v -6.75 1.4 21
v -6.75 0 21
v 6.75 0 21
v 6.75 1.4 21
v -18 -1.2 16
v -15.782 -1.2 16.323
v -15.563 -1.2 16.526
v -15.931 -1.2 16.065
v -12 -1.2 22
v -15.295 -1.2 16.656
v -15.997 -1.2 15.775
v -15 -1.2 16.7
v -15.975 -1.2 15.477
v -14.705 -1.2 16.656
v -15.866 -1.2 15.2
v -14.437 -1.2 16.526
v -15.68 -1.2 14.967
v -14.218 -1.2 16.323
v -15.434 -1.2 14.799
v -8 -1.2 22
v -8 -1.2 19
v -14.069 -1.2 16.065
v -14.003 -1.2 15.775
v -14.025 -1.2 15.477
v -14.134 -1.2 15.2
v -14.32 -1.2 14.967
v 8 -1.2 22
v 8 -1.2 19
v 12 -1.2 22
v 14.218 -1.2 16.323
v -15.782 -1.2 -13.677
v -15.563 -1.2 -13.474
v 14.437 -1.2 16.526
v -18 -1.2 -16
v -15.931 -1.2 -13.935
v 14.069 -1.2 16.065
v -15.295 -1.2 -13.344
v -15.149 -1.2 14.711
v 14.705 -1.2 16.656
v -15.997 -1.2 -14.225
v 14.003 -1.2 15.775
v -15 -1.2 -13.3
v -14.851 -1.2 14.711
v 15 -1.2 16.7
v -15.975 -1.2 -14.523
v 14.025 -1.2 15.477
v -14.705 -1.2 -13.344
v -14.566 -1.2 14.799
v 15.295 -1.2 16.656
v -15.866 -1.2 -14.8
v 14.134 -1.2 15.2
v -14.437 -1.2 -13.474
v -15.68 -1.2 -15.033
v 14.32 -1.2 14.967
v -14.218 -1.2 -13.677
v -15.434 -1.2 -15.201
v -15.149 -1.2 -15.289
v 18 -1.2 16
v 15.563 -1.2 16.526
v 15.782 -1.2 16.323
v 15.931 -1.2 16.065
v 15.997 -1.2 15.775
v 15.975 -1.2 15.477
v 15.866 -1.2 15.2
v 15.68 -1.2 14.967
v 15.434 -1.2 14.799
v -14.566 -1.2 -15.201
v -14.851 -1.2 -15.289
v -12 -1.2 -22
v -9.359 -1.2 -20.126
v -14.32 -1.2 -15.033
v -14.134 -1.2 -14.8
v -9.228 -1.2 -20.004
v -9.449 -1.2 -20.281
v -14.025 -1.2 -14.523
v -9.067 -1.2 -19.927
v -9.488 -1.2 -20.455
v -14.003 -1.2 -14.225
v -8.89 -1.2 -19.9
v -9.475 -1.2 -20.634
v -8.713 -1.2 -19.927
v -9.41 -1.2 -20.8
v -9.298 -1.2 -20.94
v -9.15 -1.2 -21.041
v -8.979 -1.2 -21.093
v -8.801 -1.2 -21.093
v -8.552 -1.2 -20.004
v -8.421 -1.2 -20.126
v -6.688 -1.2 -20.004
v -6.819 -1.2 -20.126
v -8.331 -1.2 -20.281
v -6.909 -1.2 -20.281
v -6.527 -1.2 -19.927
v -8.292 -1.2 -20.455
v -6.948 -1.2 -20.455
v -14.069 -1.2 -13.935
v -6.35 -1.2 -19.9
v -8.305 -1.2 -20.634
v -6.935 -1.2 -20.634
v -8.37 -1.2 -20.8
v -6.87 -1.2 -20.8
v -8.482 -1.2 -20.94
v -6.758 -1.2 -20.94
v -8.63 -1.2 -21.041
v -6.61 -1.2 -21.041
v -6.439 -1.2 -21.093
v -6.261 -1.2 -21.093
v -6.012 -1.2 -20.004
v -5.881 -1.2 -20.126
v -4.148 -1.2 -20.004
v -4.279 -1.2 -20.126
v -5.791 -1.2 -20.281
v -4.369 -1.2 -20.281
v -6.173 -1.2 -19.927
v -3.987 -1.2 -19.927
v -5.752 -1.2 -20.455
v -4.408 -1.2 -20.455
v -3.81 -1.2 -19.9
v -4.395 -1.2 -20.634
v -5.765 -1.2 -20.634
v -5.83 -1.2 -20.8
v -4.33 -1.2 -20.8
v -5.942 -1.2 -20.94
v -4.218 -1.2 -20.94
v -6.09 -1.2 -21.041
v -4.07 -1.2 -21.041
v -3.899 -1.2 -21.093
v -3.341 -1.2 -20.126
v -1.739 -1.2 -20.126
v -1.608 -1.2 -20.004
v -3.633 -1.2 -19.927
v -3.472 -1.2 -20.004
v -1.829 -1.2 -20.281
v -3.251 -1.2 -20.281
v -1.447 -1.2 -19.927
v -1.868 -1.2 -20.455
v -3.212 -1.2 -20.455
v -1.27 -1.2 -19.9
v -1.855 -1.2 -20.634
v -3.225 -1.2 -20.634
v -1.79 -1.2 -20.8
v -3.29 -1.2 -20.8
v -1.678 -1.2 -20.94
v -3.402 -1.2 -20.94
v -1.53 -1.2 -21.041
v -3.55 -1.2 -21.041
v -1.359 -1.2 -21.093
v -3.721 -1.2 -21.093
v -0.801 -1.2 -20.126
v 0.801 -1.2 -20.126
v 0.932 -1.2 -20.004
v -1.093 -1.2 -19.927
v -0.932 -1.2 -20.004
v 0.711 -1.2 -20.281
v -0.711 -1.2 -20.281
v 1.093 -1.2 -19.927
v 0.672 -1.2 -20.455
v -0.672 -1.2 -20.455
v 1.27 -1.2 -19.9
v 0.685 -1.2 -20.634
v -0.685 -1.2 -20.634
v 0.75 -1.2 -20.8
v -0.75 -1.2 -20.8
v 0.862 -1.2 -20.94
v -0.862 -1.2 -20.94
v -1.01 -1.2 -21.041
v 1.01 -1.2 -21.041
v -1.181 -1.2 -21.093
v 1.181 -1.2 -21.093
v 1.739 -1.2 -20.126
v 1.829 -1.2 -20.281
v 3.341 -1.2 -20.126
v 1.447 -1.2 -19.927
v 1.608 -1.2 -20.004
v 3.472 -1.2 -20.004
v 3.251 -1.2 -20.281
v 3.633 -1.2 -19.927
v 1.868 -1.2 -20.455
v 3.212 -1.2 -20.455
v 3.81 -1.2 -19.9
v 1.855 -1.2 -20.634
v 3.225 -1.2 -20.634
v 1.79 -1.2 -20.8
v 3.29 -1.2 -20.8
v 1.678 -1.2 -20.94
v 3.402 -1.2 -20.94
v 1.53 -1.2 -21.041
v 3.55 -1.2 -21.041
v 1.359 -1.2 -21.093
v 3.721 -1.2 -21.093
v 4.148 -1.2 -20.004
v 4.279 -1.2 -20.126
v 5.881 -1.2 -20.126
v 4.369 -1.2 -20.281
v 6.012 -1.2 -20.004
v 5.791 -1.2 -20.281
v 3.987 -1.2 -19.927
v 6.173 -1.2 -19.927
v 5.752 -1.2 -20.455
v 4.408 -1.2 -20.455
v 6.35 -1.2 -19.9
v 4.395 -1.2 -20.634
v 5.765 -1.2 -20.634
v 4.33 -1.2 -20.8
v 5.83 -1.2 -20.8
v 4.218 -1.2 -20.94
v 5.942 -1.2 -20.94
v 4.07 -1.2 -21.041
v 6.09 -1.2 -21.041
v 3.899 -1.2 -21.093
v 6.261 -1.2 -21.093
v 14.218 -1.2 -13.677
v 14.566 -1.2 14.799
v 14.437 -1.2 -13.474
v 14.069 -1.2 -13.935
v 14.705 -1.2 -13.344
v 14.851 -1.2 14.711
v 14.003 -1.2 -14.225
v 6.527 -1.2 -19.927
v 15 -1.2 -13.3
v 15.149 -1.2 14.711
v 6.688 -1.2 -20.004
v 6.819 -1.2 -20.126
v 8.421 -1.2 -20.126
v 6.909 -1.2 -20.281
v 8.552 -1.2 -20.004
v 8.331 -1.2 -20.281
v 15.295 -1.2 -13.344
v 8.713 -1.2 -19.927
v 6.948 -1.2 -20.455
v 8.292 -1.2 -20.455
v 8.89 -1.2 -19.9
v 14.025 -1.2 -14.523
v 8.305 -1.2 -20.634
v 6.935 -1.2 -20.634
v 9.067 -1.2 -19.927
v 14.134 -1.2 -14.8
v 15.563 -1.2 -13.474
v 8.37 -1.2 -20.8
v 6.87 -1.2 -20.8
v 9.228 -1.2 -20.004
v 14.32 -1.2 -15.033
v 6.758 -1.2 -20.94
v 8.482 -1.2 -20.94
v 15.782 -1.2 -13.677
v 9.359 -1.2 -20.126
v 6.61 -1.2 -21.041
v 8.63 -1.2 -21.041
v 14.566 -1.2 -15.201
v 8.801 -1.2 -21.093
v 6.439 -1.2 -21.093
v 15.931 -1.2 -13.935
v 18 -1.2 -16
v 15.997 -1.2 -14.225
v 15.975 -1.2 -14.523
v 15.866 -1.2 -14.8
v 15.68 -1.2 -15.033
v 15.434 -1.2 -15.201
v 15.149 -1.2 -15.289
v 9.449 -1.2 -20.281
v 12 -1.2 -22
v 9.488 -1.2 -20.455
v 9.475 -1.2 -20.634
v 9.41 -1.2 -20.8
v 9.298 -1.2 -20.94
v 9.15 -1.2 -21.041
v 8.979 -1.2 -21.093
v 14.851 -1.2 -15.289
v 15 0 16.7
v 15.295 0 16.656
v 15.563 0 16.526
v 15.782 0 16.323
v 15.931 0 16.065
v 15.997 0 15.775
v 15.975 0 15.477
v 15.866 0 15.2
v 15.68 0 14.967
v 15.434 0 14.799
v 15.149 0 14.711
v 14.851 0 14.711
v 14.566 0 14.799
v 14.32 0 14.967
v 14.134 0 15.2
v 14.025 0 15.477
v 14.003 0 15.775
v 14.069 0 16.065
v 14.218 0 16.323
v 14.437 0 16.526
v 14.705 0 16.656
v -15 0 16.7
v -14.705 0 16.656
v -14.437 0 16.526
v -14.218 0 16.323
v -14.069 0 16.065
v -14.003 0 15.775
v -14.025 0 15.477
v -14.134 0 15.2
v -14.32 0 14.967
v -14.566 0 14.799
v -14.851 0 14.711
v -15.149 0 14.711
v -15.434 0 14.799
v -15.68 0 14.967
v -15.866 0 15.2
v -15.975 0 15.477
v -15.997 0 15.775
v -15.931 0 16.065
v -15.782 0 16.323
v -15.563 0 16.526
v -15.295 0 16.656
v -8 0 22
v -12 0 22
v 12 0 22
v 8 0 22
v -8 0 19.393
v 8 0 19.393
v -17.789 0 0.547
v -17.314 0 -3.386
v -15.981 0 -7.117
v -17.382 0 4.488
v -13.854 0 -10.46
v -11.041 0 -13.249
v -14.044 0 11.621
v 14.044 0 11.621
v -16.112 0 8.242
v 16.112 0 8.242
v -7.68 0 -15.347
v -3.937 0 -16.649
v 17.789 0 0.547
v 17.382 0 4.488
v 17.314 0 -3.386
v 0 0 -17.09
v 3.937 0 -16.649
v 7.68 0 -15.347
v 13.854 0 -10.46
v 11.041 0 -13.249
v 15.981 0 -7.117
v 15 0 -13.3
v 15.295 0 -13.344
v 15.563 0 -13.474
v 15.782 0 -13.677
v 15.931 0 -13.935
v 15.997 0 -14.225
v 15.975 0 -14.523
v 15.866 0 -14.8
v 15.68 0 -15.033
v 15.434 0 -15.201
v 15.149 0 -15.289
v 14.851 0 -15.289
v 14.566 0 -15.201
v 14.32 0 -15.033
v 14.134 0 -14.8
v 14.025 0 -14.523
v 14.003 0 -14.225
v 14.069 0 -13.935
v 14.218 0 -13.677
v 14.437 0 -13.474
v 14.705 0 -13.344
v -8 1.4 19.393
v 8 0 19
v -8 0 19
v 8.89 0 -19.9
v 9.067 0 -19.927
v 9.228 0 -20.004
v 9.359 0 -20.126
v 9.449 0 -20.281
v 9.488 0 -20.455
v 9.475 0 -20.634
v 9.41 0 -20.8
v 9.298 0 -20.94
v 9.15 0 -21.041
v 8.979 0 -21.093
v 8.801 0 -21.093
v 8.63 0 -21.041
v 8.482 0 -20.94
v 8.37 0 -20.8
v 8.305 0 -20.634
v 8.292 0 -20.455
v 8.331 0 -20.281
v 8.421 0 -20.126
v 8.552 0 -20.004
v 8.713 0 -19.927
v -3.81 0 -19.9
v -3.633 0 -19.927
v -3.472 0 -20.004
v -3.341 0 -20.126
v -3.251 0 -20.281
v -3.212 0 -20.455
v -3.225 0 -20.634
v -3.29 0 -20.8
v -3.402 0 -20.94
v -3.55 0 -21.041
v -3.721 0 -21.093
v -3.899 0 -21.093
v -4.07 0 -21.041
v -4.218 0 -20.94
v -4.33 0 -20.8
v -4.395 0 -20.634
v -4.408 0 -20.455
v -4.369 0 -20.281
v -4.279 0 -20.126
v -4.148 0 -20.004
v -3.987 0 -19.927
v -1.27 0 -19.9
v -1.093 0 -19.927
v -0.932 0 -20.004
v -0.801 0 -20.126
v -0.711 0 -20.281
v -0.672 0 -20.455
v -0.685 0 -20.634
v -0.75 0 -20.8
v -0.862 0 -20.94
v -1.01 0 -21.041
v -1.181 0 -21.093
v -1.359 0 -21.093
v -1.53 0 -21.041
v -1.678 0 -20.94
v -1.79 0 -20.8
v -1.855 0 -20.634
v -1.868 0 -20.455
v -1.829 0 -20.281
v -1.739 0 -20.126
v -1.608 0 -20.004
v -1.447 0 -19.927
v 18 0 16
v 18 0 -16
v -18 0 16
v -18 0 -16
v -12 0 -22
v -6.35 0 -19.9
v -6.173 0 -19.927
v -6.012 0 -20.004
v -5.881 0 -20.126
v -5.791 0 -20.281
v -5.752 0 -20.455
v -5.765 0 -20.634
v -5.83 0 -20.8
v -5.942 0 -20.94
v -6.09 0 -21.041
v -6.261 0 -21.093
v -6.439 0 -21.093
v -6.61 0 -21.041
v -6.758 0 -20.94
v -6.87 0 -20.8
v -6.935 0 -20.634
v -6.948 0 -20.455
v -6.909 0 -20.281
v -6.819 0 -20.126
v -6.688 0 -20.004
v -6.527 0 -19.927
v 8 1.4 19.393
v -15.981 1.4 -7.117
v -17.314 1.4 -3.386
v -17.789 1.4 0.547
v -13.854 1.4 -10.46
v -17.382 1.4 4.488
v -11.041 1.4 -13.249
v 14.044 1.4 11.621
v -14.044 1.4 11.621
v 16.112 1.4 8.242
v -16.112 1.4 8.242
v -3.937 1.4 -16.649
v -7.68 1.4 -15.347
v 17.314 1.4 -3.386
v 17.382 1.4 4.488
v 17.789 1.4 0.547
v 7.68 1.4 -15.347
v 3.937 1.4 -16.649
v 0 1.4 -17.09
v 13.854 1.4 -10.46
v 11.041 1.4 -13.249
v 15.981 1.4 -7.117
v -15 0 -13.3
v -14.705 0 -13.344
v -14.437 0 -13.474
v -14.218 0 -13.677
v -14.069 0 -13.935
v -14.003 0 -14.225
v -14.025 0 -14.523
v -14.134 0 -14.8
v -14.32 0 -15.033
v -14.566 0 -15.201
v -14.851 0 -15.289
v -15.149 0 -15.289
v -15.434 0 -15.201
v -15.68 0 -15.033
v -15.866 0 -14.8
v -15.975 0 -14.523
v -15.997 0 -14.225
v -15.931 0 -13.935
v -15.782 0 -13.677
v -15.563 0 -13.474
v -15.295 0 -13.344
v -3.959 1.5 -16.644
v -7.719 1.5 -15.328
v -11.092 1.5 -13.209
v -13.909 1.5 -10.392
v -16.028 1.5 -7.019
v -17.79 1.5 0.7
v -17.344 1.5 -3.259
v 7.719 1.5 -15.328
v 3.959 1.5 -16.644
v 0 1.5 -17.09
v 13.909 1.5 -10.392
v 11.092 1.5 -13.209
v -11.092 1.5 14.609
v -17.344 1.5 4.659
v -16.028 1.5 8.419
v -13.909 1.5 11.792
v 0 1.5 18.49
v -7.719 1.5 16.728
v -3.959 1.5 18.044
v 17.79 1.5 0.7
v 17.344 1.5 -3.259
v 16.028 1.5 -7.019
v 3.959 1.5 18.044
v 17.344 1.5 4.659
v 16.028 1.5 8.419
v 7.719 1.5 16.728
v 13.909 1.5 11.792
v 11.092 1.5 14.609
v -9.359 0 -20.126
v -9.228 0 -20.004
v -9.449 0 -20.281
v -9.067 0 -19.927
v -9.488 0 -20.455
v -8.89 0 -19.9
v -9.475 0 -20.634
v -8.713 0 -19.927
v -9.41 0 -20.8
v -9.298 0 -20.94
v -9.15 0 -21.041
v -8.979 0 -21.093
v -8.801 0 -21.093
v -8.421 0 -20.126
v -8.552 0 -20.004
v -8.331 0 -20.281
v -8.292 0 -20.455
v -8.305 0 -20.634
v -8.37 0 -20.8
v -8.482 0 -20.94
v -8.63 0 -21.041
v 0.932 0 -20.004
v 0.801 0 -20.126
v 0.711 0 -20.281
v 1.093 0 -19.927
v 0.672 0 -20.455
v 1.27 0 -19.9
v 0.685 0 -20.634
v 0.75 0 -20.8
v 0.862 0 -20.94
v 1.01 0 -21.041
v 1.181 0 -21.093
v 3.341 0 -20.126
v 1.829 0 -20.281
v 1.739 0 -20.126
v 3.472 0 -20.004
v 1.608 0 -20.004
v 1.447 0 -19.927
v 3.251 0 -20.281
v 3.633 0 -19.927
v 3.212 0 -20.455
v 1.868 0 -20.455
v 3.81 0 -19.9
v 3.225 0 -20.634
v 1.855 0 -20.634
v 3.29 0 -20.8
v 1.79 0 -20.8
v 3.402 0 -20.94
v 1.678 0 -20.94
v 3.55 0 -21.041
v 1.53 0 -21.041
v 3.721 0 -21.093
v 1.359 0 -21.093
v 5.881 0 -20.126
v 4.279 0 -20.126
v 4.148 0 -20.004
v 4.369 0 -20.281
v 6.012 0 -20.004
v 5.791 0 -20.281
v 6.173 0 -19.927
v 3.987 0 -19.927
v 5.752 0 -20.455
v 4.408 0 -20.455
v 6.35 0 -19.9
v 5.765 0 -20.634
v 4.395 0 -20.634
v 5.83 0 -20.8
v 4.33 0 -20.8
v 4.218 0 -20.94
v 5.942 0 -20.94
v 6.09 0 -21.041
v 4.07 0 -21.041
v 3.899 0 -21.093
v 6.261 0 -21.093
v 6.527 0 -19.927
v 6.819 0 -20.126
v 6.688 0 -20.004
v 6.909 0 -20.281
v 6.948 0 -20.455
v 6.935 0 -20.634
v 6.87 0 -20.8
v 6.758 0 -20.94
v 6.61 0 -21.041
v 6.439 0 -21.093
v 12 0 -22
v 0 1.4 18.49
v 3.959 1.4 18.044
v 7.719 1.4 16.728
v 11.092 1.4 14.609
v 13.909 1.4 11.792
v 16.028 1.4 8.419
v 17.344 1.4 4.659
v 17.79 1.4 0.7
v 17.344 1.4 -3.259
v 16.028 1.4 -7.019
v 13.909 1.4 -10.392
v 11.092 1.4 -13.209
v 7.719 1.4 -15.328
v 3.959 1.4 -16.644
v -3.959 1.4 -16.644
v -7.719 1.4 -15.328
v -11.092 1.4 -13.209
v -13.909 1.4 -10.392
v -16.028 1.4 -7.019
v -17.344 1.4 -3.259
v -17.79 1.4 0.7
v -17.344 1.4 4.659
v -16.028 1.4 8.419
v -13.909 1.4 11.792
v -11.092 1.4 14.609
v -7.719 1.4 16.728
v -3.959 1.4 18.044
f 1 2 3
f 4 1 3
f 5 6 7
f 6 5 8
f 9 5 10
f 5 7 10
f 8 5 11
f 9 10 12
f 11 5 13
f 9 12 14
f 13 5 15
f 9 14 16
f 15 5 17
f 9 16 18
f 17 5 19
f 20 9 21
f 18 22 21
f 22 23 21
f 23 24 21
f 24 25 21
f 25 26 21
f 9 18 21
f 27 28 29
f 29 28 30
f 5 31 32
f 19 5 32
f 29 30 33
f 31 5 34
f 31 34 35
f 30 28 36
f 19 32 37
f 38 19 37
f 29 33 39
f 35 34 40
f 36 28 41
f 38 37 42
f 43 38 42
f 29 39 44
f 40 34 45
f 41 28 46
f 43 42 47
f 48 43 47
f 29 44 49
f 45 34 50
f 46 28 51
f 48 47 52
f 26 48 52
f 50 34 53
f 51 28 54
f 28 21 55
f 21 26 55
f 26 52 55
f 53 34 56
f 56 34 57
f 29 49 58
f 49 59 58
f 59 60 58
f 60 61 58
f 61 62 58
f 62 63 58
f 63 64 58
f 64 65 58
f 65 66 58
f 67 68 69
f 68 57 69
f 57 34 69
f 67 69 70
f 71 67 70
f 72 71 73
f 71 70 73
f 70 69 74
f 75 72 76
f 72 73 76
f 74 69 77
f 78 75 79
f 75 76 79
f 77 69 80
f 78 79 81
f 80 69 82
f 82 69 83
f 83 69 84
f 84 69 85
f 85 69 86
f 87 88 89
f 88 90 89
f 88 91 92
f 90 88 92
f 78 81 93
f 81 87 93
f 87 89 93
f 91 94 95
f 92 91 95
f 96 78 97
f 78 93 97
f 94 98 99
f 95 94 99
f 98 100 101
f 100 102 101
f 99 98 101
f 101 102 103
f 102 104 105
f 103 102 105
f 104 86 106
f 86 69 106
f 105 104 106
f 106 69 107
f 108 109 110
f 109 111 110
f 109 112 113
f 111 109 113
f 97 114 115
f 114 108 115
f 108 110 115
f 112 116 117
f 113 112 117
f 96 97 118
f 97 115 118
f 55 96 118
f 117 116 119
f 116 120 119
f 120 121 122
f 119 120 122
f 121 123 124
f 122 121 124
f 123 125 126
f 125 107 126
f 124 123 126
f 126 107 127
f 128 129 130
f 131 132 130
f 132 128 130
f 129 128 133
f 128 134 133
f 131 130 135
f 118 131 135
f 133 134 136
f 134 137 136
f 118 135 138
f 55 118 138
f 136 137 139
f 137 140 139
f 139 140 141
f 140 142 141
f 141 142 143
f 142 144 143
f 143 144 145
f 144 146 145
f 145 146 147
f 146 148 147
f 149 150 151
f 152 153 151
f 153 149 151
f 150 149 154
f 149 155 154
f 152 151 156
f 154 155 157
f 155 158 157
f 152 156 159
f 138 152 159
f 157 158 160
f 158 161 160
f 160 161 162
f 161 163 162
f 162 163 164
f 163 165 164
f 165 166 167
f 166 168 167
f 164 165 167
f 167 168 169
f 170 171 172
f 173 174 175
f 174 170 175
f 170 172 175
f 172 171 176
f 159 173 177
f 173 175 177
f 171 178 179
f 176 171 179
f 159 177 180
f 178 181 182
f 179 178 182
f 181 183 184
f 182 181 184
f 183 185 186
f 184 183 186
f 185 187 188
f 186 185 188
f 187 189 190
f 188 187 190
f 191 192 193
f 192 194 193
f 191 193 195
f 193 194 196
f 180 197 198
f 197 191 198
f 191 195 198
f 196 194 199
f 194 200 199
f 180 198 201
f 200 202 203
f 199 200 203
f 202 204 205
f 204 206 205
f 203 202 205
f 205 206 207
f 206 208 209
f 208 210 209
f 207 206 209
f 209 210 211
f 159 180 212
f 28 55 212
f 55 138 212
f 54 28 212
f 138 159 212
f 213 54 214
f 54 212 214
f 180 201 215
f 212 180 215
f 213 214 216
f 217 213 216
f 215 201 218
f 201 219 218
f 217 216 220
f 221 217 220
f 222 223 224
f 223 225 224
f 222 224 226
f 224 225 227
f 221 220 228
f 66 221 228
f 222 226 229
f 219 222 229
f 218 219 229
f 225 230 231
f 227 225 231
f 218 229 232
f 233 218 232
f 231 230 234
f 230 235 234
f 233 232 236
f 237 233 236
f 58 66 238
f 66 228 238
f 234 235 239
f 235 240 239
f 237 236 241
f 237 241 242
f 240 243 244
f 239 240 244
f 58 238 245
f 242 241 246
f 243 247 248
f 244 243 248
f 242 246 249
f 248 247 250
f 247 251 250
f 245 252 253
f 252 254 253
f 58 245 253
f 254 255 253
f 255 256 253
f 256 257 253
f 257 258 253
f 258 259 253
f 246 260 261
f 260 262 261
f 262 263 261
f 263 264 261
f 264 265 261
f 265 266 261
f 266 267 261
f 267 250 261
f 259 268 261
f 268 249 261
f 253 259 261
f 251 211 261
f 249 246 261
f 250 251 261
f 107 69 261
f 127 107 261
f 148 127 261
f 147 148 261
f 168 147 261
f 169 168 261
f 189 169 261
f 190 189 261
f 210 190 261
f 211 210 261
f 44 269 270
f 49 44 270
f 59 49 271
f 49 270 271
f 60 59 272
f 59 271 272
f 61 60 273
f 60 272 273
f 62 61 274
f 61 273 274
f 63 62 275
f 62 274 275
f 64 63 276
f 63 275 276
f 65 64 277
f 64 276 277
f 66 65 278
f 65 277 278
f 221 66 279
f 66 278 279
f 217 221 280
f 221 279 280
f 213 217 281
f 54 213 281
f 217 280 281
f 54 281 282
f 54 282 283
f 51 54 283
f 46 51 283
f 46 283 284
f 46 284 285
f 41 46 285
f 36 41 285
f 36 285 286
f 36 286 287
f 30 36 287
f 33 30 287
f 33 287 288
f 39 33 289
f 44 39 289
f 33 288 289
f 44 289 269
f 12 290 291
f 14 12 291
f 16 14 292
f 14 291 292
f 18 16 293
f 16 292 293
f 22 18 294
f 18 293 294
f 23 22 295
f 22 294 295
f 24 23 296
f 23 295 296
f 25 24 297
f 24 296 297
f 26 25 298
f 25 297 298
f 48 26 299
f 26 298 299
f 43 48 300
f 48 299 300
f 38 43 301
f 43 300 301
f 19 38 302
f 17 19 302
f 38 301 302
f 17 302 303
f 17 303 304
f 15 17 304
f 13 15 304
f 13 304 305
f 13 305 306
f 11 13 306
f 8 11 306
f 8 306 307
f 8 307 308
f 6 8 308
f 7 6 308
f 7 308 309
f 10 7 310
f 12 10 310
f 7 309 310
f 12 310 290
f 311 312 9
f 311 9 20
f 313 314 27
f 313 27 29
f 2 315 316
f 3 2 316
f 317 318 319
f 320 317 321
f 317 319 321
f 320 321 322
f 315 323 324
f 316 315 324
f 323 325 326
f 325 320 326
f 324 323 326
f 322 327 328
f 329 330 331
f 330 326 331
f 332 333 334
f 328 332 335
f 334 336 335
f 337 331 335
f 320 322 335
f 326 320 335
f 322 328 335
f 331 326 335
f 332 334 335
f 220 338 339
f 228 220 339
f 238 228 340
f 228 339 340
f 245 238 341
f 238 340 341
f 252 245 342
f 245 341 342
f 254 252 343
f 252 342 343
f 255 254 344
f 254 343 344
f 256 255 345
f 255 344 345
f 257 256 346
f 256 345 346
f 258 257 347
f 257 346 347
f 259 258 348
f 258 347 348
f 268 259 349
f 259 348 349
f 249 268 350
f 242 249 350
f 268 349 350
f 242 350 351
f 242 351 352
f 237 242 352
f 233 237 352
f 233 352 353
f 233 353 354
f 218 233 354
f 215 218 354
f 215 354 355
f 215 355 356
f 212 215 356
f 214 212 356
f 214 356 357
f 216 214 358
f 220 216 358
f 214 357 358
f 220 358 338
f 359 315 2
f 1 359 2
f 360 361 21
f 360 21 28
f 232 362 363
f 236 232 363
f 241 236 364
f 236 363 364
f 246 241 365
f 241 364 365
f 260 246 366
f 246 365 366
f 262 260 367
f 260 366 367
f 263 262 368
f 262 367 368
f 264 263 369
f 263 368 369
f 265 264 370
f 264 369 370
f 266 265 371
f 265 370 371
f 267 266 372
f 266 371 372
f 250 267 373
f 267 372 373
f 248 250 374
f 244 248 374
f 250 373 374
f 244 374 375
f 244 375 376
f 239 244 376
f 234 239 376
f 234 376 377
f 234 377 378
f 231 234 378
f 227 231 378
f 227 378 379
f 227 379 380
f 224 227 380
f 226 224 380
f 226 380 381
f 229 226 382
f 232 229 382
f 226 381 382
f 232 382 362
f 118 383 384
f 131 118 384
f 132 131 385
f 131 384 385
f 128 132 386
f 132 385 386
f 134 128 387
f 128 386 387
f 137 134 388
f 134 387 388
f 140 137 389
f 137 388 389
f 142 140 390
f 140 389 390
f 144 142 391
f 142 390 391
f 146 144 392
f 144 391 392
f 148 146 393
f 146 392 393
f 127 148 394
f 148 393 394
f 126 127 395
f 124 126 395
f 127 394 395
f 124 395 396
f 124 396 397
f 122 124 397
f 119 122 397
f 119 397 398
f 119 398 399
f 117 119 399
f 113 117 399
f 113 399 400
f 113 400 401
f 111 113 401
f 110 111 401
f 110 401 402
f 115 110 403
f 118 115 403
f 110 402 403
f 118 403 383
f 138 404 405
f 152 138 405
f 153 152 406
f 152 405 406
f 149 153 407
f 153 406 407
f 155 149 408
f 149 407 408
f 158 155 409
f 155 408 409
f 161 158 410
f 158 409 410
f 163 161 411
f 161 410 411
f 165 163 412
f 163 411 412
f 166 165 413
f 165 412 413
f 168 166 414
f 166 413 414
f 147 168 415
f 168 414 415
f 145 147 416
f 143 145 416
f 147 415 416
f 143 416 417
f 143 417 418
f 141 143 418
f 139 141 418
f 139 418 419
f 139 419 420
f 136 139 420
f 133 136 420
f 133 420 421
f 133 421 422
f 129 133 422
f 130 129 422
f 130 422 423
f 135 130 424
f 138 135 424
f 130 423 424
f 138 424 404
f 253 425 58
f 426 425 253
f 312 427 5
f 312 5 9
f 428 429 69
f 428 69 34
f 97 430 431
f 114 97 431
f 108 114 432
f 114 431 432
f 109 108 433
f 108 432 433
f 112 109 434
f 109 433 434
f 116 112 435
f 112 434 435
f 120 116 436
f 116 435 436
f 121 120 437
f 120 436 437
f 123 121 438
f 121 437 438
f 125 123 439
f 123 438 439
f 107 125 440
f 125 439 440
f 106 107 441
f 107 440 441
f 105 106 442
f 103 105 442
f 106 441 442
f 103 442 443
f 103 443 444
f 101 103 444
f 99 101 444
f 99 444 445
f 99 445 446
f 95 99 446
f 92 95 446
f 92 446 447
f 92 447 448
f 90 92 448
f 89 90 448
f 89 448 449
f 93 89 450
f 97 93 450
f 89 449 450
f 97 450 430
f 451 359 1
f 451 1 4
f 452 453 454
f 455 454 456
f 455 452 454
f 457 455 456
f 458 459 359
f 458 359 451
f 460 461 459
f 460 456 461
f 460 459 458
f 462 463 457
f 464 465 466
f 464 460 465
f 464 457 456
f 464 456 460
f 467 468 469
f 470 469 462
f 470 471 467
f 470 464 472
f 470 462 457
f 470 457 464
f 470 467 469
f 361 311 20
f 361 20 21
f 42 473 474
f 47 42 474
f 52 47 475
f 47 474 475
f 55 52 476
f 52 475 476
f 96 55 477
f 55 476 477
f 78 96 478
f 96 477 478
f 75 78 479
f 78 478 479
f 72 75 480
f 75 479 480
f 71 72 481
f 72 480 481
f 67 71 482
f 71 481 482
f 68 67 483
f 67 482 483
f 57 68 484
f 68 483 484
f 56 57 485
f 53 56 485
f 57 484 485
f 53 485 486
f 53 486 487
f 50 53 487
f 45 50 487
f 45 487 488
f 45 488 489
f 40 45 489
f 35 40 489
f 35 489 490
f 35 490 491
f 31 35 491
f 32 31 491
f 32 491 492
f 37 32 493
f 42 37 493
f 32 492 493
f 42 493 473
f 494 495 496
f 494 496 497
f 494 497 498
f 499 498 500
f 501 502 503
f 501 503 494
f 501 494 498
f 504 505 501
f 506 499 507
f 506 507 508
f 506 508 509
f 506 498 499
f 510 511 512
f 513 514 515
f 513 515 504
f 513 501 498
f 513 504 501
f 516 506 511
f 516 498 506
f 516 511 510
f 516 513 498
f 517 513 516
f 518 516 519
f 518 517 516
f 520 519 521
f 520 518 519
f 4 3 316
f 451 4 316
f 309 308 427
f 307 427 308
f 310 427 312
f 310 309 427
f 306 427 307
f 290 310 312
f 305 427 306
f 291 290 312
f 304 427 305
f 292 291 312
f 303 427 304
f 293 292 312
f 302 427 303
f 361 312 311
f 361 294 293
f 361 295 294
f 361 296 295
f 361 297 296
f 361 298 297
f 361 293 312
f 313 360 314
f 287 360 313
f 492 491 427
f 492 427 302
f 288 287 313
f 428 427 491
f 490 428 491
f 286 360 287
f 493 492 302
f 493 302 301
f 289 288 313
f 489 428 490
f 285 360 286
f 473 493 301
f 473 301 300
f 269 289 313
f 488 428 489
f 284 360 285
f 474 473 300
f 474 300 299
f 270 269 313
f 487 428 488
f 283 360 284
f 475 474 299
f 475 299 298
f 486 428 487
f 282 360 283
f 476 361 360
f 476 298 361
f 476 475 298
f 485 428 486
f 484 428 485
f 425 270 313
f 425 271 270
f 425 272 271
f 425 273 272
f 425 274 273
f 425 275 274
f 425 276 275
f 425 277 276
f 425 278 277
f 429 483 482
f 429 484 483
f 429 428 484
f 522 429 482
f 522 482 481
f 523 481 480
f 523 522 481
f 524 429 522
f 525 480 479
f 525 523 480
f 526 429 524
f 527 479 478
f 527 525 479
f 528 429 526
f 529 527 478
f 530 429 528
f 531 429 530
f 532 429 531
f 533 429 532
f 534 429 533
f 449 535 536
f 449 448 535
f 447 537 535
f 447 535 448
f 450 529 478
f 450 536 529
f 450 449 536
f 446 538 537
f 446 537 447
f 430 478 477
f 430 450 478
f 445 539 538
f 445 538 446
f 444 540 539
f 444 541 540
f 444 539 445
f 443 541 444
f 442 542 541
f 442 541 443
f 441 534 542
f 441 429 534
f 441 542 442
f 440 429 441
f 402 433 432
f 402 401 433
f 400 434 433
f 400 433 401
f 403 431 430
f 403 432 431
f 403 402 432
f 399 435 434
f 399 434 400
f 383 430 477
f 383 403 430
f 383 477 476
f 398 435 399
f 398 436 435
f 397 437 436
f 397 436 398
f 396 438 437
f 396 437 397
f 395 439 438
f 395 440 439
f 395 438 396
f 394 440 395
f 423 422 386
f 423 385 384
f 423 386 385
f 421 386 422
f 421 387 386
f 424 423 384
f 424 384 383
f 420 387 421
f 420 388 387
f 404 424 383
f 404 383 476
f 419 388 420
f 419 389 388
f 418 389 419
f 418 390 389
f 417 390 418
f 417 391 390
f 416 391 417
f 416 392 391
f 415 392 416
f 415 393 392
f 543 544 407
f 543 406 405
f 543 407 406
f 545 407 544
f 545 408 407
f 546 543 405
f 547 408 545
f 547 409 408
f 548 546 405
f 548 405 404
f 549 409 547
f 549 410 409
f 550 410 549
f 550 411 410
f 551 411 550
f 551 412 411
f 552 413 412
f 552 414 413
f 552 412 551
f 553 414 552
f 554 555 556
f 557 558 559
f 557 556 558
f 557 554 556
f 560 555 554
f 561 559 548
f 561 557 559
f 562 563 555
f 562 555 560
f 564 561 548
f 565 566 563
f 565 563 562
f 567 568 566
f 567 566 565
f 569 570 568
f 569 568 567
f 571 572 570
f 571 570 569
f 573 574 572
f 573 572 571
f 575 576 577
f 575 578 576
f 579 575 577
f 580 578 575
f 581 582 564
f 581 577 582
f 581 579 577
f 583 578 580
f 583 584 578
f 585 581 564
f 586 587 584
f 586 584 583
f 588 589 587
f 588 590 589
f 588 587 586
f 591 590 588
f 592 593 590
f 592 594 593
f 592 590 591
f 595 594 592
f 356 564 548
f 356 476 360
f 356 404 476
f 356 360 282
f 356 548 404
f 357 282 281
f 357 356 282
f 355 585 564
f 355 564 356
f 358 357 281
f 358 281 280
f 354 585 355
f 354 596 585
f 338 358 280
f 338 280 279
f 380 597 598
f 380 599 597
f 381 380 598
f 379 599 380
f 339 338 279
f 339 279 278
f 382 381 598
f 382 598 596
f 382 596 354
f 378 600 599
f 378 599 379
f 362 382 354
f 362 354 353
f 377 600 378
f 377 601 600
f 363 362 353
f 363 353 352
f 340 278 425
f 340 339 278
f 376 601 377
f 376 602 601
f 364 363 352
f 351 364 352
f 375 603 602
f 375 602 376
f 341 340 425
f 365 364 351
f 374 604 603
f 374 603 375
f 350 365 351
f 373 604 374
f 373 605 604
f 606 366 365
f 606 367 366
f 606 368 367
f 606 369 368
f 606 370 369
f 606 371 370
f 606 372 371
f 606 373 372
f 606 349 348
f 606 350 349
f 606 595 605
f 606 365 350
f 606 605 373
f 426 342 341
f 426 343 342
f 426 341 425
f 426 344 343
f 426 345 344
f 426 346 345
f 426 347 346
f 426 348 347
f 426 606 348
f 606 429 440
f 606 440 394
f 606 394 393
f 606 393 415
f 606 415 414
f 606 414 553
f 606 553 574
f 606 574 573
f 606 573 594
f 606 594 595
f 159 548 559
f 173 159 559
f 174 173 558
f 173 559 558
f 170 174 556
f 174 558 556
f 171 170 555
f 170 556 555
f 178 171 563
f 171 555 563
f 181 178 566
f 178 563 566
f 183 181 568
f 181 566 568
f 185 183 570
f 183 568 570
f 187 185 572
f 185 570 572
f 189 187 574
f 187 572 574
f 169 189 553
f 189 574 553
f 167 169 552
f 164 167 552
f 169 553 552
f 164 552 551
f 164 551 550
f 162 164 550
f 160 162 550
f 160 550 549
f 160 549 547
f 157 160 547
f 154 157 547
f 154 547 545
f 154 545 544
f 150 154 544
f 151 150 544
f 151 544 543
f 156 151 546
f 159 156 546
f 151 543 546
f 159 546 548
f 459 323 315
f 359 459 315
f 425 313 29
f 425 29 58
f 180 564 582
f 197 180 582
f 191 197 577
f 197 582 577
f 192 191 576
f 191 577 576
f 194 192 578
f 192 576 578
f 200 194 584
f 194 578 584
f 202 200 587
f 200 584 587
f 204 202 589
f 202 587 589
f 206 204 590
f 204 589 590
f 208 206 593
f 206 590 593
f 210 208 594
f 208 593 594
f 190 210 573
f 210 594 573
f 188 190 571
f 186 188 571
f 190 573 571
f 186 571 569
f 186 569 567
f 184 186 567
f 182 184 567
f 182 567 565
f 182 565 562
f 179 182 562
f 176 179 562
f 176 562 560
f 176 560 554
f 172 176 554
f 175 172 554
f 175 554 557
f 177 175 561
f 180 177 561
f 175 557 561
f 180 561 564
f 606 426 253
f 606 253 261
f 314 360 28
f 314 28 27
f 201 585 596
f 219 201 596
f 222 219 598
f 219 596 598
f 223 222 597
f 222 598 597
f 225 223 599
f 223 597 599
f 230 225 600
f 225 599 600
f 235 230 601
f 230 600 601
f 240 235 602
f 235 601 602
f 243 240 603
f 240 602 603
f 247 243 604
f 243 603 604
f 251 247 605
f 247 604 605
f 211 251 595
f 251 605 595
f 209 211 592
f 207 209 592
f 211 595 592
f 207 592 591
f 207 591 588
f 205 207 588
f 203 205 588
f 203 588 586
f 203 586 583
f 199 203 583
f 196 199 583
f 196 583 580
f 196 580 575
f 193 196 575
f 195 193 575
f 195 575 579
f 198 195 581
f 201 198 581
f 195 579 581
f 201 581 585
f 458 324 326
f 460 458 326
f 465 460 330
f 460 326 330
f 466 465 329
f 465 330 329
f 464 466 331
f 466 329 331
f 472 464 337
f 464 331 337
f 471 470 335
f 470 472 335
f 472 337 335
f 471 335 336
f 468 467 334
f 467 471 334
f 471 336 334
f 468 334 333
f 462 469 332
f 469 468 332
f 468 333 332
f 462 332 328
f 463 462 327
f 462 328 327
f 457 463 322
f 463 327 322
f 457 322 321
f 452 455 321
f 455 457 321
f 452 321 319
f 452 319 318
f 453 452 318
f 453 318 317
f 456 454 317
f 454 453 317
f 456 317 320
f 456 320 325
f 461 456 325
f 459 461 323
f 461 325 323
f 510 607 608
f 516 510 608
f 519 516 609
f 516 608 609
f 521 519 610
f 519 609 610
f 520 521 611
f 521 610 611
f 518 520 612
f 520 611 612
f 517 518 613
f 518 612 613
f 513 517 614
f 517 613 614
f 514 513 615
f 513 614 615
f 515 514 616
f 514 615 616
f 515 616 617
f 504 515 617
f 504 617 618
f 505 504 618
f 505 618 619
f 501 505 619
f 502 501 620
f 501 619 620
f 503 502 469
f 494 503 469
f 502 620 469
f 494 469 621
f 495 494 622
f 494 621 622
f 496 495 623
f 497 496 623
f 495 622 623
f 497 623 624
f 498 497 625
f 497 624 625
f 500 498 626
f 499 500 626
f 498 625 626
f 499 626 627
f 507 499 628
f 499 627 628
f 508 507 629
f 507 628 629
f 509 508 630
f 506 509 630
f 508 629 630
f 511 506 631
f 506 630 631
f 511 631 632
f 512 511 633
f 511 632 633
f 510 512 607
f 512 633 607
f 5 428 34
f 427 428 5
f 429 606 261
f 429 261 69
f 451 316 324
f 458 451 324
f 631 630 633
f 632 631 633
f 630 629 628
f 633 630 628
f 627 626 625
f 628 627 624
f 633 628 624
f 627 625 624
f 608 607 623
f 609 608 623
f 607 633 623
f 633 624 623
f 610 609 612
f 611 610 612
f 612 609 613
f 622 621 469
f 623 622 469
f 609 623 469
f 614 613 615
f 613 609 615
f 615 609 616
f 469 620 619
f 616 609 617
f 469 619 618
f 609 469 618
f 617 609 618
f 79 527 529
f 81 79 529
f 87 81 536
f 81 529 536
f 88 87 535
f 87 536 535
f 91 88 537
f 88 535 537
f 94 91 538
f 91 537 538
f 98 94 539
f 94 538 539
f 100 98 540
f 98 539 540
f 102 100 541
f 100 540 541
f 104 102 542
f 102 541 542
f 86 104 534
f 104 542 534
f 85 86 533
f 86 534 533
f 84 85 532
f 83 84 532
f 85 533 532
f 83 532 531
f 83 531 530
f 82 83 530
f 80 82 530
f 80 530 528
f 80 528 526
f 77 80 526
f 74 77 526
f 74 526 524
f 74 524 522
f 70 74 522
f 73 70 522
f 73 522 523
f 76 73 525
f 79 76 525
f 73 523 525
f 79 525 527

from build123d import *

# Parameters (mm, degrees)
SKETCH2_R           = 1
SKETCH2_R_2         = 0.6
SKETCH2_R_3         = 17.79
SKETCH2_R_4         = 16.2
BOSS_EXTRUDE1_DEPTH = 1.2
SKETCH2_3_R         = 17.79
SKETCH2_3_R_2       = 16.2
BOSS_EXTRUDE2_DEPTH = 1.4
BOSS_EXTRUDE3_START = 1.4
SKETCH2_4_R         = 17.79
SKETCH2_4_R_2       = 16.2
BOSS_EXTRUDE3_DEPTH = 0.1


with BuildPart() as part:
    # Sketch2 → Boss-Extrude1 (new body)
    # profile 1 of 4: a face of its own
    with BuildSketch(Plane(origin=(0, 0, 0), x_dir=(1, 0, 0), z_dir=(0, 1, 0))):
        with BuildLine():
            Line((-18, 16), (-18, -16))
            Line((-18, -16), (-12, -22))
            Line((-12, -22), (-8, -22))
            Line((-8, -22), (-8, -19.392543934))
            Line((-8, -19.392543934), (-14.043607284, -11.620677381))
            ThreePointArc((-14.043607284, -11.620677381), (-5.772708481, 16.127356797), (17.79, -0.7))
            ThreePointArc((17.79, -0.7), (16.827356797, -6.472708481), (14.043607284, -11.620677381))
            Line((14.043607284, -11.620677381), (8, -19.392543934))
            Line((8, -19.392543934), (8, -22))
            Line((8, -22), (12, -22))
            Line((12, -22), (18, -16))
            Line((18, -16), (18, 16))
            Line((18, 16), (12, 22))
            Line((12, 22), (-12, 22))
            Line((-12, 22), (-18, 16))
        make_face()
        with Locations(Location((-15, -15.7, 0), (0, 0, 270))):
            Circle(SKETCH2_R, mode=Mode.SUBTRACT)
        with Locations(Location((15, -15.7, 0), (0, 0, 270))):
            Circle(SKETCH2_R, mode=Mode.SUBTRACT)
        with Locations(Location((-15, 14.3, 0), (0, 0, 270))):
            Circle(SKETCH2_R, mode=Mode.SUBTRACT)
        with Locations(Location((-8.89, 20.5, 0), (0, 0, 270))):
            Circle(SKETCH2_R_2, mode=Mode.SUBTRACT)
        with Locations(Location((-6.35, 20.5, 0), (0, 0, 270))):
            Circle(SKETCH2_R_2, mode=Mode.SUBTRACT)
        with Locations(Location((-3.81, 20.5, 0), (0, 0, 270))):
            Circle(SKETCH2_R_2, mode=Mode.SUBTRACT)
        with Locations(Location((-1.27, 20.5, 0), (0, 0, 270))):
            Circle(SKETCH2_R_2, mode=Mode.SUBTRACT)
        with Locations(Location((1.27, 20.5, 0), (0, 0, 270))):
            Circle(SKETCH2_R_2, mode=Mode.SUBTRACT)
        with Locations(Location((3.81, 20.5, 0), (0, 0, 270))):
            Circle(SKETCH2_R_2, mode=Mode.SUBTRACT)
        with Locations(Location((6.35, 20.5, 0), (0, 0, 270))):
            Circle(SKETCH2_R_2, mode=Mode.SUBTRACT)
        with Locations(Location((8.89, 20.5, 0), (0, 0, 270))):
            Circle(SKETCH2_R_2, mode=Mode.SUBTRACT)
        with Locations(Location((15, 14.3, 0), (0, 0, 270))):
            Circle(SKETCH2_R, mode=Mode.SUBTRACT)
    # profile 2 of 4: a face of its own
    with BuildSketch(Plane(origin=(0, 0, 0), x_dir=(1, 0, 0), z_dir=(0, 1, 0))):
        with Locations((0, -0.7)):
            Circle(SKETCH2_R_3)
        with Locations((0, -0.7)):
            Circle(SKETCH2_R_4, mode=Mode.SUBTRACT)
    # profile 3 of 4: a face of its own
    with BuildSketch(Plane(origin=(0, 0, 0), x_dir=(1, 0, 0), z_dir=(0, 1, 0))):
        with Locations((0, -0.7)):
            Circle(SKETCH2_R_4)
    # profile 4 of 4: a face of its own
    with BuildSketch(Plane(origin=(0, 0, 0), x_dir=(1, 0, 0), z_dir=(0, 1, 0))):
        with BuildLine():
            Line((-14.043607284, -11.620677381), (-8, -19.392543934))
            Line((-8, -19.392543934), (-8, -19))
            Line((-8, -19), (8, -19))
            Line((8, -19), (8, -19.392543934))
            Line((8, -19.392543934), (14.043607284, -11.620677381))
            ThreePointArc((14.043607284, -11.620677381), (0, -18.49), (-14.043607284, -11.620677381))
        make_face()
    extrude(amount=-BOSS_EXTRUDE1_DEPTH)


with BuildPart() as body_2:
    # Sketch2<3> → Boss-Extrude2 (new body)
    # profile 1 of 4: a face of its own
    with BuildSketch(Plane(origin=(0, 0, 0), x_dir=(1, 0, 0), z_dir=(0, 1, 0))):
        with BuildLine():
            Line((-14.043607284, -11.620677381), (-8, -19.392543934))
            Line((-8, -19.392543934), (-8, -19))
            Line((-8, -19), (8, -19))
            Line((8, -19), (8, -19.392543934))
            Line((8, -19.392543934), (14.043607284, -11.620677381))
            ThreePointArc((14.043607284, -11.620677381), (0, -18.49), (-14.043607284, -11.620677381))
        make_face()
    # profile 2 of 4: a face of its own
    with BuildSketch(Plane(origin=(0, 0, 0), x_dir=(1, 0, 0), z_dir=(0, 1, 0))):
        with Locations((0, -0.7)):
            Circle(SKETCH2_3_R)
        with Locations((0, -0.7)):
            Circle(SKETCH2_3_R_2, mode=Mode.SUBTRACT)
    # profile 3 of 4: a face of its own
    with BuildSketch(Plane(origin=(0, 0, 0), x_dir=(1, 0, 0), z_dir=(0, 1, 0))):
        Polygon((-8, -19), (-8, -19.392543934), (-6.75, -21), (6.75, -21), (8, -19.392543934), (8, -19), align=None)
    # profile 4 of 4: a face of its own
    with BuildSketch(Plane(origin=(0, 0, 0), x_dir=(1, 0, 0), z_dir=(0, 1, 0))):
        with Locations((0, -0.7)):
            Circle(SKETCH2_3_R_2)
    extrude(amount=BOSS_EXTRUDE2_DEPTH)


with BuildPart() as body_3:
    # Sketch2<4> → Boss-Extrude3 (new body)
    # profile 1 of 2: a face of its own
    with BuildSketch(Plane(origin=(0, 0, 0), x_dir=(1, 0, 0), z_dir=(0, 1, 0)).offset(BOSS_EXTRUDE3_START)):
        with Locations(Location((0, -0.7, 0), (0, 0, 270))):
            Circle(SKETCH2_4_R)
        with Locations((0, -0.7)):
            Circle(SKETCH2_4_R_2, mode=Mode.SUBTRACT)
    # profile 2 of 2: a face of its own
    with BuildSketch(Plane(origin=(0, 0, 0), x_dir=(1, 0, 0), z_dir=(0, 1, 0)).offset(BOSS_EXTRUDE3_START)):
        with Locations((0, -0.7)):
            Circle(SKETCH2_4_R_2)
    extrude(amount=BOSS_EXTRUDE3_DEPTH)


solid = Compound([part.part, body_2.part, body_3.part])
